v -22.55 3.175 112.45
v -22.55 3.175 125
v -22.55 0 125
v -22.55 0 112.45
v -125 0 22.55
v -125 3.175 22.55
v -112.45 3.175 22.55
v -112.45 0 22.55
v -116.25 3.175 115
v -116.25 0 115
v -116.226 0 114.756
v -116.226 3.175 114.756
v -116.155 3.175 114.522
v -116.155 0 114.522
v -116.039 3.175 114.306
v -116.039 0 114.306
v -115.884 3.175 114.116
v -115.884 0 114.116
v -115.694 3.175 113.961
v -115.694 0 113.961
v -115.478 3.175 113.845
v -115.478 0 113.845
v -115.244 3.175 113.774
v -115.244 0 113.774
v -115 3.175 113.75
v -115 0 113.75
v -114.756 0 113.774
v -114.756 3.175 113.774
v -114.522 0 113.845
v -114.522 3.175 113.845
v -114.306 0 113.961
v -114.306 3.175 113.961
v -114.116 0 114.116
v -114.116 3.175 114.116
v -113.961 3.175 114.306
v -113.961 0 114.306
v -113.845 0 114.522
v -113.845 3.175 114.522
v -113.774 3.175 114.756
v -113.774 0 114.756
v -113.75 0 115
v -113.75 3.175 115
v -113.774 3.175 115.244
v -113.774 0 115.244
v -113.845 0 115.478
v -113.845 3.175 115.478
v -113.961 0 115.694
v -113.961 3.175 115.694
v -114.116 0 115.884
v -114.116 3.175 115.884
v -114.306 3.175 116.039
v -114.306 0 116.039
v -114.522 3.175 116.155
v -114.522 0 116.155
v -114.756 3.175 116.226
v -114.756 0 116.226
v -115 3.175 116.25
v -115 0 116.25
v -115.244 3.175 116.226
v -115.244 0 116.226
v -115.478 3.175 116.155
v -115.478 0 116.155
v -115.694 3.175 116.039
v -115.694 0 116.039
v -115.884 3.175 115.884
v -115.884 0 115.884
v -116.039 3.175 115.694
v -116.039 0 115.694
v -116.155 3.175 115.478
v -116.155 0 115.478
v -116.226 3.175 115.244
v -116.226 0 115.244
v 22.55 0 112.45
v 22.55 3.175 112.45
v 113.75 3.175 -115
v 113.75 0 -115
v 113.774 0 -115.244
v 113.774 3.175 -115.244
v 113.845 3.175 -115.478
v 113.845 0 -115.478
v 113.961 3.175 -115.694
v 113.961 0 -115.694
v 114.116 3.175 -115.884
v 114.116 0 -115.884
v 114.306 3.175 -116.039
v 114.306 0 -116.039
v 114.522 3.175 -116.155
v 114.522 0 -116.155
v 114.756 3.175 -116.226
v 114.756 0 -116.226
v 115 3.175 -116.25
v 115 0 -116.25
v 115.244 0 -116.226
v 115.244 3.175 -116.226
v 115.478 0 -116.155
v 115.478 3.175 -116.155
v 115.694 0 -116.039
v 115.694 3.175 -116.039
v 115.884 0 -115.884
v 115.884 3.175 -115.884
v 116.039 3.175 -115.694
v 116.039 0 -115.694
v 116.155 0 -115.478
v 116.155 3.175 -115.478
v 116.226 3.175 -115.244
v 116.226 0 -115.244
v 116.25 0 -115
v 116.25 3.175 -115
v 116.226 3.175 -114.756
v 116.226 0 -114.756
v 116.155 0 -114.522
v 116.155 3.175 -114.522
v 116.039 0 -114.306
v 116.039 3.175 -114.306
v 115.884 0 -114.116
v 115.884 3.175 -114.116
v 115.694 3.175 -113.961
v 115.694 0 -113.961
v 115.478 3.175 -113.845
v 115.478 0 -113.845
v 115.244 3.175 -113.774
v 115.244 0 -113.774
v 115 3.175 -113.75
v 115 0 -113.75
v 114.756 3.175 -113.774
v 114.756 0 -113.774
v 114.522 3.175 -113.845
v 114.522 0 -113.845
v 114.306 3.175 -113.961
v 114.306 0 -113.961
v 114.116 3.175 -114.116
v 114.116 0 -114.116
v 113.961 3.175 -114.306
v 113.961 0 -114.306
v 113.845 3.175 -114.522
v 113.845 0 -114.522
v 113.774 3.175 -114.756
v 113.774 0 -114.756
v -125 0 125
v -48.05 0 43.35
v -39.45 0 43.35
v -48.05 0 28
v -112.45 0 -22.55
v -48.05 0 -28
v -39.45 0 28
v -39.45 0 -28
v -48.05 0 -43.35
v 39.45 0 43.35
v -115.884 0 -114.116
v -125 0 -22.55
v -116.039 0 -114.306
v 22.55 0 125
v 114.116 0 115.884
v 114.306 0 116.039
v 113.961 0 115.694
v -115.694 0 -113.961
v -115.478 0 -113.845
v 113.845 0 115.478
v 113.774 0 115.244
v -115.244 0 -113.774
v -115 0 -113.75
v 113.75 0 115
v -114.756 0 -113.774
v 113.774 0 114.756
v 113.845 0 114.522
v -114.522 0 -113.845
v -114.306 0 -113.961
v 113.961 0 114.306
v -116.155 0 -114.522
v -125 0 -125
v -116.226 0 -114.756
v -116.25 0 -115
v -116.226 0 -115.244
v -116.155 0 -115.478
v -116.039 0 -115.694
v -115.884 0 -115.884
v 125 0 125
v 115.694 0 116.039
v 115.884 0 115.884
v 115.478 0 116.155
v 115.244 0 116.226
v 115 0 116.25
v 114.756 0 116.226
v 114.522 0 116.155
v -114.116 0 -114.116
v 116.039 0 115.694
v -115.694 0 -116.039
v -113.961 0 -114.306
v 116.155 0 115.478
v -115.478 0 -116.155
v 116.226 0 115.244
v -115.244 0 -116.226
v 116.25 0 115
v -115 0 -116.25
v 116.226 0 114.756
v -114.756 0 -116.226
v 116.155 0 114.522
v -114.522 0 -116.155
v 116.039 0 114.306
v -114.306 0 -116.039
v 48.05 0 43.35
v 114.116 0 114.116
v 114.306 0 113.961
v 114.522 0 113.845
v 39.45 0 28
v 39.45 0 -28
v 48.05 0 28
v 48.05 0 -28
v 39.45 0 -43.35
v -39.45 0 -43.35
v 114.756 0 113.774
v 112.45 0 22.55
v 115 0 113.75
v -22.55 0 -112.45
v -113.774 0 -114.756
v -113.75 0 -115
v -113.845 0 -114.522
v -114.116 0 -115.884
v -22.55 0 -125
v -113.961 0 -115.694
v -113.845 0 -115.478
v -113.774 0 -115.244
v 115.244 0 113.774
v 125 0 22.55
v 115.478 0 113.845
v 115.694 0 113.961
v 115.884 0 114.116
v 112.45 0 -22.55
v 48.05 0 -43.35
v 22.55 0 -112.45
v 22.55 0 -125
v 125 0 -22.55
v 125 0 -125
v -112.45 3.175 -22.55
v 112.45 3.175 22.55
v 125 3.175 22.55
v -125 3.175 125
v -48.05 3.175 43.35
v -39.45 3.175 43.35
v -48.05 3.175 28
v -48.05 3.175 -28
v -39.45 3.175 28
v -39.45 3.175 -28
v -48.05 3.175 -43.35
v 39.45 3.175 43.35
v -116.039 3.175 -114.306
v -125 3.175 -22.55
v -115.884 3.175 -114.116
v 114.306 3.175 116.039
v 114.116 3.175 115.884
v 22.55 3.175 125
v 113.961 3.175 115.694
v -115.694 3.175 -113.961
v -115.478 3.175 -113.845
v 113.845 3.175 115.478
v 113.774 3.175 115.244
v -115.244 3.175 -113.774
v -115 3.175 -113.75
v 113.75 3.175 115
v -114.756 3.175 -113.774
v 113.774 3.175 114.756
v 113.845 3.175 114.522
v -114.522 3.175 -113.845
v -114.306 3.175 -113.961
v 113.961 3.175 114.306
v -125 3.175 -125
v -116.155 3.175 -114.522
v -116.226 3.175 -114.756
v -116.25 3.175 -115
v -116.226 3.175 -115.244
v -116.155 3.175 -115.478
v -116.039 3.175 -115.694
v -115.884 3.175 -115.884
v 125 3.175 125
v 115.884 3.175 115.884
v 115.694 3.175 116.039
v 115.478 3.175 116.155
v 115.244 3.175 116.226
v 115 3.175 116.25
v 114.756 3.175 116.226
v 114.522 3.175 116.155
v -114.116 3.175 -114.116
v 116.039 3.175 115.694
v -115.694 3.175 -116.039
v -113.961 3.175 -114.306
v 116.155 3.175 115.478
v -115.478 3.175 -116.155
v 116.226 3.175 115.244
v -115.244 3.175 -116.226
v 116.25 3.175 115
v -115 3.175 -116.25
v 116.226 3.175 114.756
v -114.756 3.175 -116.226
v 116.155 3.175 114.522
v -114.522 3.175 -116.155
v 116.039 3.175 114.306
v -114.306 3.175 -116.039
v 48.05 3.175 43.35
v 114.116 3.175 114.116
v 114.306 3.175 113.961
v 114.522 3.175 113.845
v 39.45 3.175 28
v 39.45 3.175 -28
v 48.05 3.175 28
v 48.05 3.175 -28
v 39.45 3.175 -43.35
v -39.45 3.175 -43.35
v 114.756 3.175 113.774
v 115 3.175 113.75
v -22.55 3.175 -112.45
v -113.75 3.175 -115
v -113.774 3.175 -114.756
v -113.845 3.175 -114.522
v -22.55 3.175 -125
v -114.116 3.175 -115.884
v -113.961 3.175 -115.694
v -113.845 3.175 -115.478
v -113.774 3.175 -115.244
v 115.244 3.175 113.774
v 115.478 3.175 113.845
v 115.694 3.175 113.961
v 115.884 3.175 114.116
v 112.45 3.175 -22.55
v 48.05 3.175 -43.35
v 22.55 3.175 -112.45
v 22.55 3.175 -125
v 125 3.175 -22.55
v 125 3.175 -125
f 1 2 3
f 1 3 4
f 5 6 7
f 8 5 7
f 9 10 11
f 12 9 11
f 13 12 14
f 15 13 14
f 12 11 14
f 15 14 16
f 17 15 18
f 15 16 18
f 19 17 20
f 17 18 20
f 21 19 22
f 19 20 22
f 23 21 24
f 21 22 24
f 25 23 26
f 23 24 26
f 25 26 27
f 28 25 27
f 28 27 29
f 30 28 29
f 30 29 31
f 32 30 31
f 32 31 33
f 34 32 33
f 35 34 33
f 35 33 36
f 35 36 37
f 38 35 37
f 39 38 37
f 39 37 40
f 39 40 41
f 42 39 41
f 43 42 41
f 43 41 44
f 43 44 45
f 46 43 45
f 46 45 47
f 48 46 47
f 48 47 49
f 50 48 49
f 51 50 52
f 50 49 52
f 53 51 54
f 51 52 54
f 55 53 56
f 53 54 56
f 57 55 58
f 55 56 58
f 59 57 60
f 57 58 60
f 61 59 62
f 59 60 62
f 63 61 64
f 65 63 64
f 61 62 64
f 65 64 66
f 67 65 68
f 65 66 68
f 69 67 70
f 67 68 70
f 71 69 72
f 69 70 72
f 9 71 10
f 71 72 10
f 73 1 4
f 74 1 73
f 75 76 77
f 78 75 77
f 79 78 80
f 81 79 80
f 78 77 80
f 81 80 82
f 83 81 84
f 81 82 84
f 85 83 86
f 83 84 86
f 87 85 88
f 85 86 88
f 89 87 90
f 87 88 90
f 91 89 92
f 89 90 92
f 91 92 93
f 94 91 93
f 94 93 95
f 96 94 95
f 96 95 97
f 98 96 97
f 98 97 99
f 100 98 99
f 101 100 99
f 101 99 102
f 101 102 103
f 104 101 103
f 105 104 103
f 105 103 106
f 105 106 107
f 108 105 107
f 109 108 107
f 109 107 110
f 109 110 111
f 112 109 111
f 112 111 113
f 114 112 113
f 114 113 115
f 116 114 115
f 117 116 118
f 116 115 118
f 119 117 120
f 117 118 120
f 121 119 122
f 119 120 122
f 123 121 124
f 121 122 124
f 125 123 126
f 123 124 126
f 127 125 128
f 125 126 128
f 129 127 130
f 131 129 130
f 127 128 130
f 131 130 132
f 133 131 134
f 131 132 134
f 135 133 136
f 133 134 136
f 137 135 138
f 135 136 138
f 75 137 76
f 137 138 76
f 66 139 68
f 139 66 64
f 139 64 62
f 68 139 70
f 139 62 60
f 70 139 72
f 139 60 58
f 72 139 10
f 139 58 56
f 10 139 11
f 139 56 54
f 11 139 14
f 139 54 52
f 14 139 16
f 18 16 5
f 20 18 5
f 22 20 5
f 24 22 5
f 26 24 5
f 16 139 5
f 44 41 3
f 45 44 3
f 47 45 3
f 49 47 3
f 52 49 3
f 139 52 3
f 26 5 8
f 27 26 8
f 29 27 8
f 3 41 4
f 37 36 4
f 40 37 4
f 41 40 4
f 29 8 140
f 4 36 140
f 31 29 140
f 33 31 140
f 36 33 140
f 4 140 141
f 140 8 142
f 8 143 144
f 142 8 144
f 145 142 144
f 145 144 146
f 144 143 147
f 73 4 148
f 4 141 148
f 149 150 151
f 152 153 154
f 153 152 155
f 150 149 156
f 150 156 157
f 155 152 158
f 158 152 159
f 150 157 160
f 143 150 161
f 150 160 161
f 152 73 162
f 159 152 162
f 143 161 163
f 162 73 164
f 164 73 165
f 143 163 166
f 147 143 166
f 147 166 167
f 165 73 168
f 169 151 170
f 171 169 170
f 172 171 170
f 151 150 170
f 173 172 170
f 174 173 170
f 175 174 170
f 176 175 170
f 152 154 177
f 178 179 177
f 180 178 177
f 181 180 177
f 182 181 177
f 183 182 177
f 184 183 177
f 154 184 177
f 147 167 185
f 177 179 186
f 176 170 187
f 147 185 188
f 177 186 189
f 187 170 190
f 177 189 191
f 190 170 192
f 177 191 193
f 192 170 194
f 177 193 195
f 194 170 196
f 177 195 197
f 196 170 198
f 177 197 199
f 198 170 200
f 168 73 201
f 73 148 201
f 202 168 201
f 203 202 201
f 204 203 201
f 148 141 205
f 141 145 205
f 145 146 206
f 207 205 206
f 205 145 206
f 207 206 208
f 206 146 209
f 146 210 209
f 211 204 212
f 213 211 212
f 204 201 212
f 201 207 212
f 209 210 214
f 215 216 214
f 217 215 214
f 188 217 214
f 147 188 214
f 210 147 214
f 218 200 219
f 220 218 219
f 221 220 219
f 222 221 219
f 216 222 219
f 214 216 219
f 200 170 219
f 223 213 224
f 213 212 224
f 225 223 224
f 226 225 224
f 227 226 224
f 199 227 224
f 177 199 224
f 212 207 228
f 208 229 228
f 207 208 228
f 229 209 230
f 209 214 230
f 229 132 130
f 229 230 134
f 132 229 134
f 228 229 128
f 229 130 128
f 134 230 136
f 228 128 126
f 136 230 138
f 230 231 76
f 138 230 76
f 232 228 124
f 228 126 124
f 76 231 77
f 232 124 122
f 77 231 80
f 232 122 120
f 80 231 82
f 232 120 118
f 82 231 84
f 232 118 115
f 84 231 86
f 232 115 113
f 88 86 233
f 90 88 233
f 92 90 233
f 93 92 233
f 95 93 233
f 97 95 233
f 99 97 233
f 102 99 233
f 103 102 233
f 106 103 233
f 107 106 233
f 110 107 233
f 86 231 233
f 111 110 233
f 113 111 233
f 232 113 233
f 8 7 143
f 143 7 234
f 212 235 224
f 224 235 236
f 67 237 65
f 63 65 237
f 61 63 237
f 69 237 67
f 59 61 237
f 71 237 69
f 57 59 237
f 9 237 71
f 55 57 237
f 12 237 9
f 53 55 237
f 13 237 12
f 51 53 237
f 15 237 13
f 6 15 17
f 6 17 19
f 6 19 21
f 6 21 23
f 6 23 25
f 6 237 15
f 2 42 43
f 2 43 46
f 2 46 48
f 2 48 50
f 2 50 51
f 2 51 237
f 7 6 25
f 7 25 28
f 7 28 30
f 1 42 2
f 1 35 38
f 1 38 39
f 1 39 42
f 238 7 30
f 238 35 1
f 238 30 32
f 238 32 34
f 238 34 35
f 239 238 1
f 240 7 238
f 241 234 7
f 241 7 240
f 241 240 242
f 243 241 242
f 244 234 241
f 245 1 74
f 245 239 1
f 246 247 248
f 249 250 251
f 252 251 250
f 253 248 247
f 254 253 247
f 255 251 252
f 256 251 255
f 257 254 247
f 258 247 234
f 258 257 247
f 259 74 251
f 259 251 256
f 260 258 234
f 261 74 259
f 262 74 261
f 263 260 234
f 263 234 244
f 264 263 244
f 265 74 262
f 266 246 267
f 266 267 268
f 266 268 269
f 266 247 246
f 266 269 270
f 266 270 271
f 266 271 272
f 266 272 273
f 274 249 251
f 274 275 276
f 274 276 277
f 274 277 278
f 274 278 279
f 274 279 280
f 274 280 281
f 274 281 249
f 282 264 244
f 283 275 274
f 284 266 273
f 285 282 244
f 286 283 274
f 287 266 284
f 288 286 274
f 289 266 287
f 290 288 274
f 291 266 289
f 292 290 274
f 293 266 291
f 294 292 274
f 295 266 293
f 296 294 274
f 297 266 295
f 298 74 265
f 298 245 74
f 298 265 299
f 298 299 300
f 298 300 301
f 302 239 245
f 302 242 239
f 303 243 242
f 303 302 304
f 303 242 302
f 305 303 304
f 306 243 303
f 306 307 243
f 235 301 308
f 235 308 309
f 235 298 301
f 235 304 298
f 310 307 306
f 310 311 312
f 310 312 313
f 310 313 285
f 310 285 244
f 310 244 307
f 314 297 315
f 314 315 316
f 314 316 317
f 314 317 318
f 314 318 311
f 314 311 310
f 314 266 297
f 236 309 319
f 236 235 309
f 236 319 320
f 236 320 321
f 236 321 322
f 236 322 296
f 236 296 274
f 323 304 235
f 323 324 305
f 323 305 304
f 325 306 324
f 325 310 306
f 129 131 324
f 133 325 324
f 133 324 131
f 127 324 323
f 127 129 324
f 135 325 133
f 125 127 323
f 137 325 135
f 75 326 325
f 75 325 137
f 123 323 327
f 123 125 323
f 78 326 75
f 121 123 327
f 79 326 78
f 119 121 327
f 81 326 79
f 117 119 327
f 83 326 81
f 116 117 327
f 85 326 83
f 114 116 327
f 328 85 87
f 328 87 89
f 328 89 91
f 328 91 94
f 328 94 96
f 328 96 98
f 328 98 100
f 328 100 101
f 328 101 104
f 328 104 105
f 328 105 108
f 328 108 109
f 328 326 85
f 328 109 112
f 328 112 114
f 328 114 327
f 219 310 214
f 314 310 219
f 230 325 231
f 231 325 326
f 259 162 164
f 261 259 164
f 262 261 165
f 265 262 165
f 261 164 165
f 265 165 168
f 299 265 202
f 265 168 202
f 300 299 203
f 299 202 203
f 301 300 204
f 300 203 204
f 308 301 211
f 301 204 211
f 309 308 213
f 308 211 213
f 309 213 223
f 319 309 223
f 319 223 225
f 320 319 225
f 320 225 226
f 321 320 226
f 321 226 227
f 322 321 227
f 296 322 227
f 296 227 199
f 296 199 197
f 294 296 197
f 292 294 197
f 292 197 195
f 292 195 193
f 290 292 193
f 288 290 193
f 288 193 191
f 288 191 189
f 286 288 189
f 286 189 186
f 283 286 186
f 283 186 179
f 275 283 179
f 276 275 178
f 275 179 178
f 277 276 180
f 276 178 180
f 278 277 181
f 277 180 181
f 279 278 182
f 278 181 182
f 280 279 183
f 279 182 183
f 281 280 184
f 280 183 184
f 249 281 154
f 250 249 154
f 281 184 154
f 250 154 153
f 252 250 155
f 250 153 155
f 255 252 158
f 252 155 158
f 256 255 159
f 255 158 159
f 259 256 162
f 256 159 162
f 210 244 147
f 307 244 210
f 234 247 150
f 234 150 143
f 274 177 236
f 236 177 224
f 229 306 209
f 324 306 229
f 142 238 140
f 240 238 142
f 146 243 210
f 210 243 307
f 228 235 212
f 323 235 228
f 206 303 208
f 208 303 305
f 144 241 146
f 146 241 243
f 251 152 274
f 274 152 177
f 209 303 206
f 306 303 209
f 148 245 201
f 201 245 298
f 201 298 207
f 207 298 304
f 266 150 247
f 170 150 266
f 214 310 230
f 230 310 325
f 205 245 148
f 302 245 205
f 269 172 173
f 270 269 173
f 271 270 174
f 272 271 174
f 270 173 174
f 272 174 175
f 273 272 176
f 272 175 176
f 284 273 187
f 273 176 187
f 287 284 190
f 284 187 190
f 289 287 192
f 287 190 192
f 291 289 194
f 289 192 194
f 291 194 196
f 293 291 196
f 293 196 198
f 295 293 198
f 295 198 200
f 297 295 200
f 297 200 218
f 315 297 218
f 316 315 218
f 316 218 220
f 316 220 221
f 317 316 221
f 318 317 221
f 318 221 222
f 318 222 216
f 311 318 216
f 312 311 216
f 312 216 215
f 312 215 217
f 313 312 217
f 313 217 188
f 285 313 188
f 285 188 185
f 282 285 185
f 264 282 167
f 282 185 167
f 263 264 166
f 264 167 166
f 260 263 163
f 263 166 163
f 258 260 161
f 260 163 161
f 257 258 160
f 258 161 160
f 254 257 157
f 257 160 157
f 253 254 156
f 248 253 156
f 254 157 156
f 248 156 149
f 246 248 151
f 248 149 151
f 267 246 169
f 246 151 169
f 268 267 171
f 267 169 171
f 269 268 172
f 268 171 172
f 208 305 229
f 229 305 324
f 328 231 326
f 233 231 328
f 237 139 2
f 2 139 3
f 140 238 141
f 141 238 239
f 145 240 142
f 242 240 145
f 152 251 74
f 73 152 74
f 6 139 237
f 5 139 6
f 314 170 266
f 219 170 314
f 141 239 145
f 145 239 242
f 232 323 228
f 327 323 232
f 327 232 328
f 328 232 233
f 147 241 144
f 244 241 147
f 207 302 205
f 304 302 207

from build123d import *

# Parameters (mm, degrees)
SKETCH2_W           = 250
SKETCH2_H           = 250
BOSS_EXTRUDE1_DEPTH = 3.175
SKETCH3_W           = 8.6
SKETCH3_H           = 15.35
CUT_EXTRUDE1_DEPTH  = 10
SKETCH4_W           = 45.1
SKETCH4_H           = 25.1
SKETCH4_W_2         = 25.1
SKETCH4_H_2         = 45.1
CUT_EXTRUDE2_DEPTH  = 10
M3_TAPPED_HOLE1_D   = 2.5
M3_TAPPED_HOLE2_D   = 2.5


with BuildPart() as part:
    # Sketch2 → Boss-Extrude1 (new body)
    with BuildSketch(Plane(origin=(0, 0, 0), x_dir=(1, 0, 0), z_dir=(0, 1, 0))):
        Rectangle(SKETCH2_W, SKETCH2_H)
    extrude(amount=BOSS_EXTRUDE1_DEPTH)

    # Sketch3 → Cut-Extrude1 (cut)
    with BuildSketch(Plane(origin=(0, 3.175, 0), x_dir=(1, 0, 0), z_dir=(0, 1, 0))):
        with Locations((-43.75, 35.675)):
            Rectangle(SKETCH3_W, SKETCH3_H)
        with Locations((-43.75, -35.675)):
            Rectangle(SKETCH3_W, SKETCH3_H)
        with Locations((43.75, -35.675)):
            Rectangle(SKETCH3_W, SKETCH3_H)
        with Locations((43.75, 35.675)):
            Rectangle(SKETCH3_W, SKETCH3_H)
    extrude(amount=-CUT_EXTRUDE1_DEPTH, mode=Mode.SUBTRACT)

    # Sketch4 → Cut-Extrude2 (cut)
    with BuildSketch(Plane(origin=(0, 3.175, 0), x_dir=(1, 0, 0), z_dir=(0, 1, 0))):
        with Locations((0, 125)):
            Rectangle(SKETCH4_W, SKETCH4_H)
        with Locations((125, 0)):
            Rectangle(SKETCH4_W_2, SKETCH4_H_2)
        with Locations((0, -125)):
            Rectangle(SKETCH4_W, SKETCH4_H)
        with Locations((-125, 0)):
            Rectangle(SKETCH4_W_2, SKETCH4_H_2)
    extrude(amount=-CUT_EXTRUDE2_DEPTH, mode=Mode.SUBTRACT)

    # M3 Tapped Hole1 (through all)
    with Locations(Plane(origin=(0, 3.175, 0), x_dir=(1, 0, 0), z_dir=(0, 1, 0))):
        with Locations((-115, 115)):
            Hole(M3_TAPPED_HOLE1_D / 2)

    # M3 Tapped Hole2 (through all)
    with Locations(Plane(origin=(0, 3.175, 0), x_dir=(1, 0, 0), z_dir=(0, 1, 0))):
        with Locations((115, 115), (115, -115), (-115, -115)):
            Hole(M3_TAPPED_HOLE2_D / 2)


solid = part.part
